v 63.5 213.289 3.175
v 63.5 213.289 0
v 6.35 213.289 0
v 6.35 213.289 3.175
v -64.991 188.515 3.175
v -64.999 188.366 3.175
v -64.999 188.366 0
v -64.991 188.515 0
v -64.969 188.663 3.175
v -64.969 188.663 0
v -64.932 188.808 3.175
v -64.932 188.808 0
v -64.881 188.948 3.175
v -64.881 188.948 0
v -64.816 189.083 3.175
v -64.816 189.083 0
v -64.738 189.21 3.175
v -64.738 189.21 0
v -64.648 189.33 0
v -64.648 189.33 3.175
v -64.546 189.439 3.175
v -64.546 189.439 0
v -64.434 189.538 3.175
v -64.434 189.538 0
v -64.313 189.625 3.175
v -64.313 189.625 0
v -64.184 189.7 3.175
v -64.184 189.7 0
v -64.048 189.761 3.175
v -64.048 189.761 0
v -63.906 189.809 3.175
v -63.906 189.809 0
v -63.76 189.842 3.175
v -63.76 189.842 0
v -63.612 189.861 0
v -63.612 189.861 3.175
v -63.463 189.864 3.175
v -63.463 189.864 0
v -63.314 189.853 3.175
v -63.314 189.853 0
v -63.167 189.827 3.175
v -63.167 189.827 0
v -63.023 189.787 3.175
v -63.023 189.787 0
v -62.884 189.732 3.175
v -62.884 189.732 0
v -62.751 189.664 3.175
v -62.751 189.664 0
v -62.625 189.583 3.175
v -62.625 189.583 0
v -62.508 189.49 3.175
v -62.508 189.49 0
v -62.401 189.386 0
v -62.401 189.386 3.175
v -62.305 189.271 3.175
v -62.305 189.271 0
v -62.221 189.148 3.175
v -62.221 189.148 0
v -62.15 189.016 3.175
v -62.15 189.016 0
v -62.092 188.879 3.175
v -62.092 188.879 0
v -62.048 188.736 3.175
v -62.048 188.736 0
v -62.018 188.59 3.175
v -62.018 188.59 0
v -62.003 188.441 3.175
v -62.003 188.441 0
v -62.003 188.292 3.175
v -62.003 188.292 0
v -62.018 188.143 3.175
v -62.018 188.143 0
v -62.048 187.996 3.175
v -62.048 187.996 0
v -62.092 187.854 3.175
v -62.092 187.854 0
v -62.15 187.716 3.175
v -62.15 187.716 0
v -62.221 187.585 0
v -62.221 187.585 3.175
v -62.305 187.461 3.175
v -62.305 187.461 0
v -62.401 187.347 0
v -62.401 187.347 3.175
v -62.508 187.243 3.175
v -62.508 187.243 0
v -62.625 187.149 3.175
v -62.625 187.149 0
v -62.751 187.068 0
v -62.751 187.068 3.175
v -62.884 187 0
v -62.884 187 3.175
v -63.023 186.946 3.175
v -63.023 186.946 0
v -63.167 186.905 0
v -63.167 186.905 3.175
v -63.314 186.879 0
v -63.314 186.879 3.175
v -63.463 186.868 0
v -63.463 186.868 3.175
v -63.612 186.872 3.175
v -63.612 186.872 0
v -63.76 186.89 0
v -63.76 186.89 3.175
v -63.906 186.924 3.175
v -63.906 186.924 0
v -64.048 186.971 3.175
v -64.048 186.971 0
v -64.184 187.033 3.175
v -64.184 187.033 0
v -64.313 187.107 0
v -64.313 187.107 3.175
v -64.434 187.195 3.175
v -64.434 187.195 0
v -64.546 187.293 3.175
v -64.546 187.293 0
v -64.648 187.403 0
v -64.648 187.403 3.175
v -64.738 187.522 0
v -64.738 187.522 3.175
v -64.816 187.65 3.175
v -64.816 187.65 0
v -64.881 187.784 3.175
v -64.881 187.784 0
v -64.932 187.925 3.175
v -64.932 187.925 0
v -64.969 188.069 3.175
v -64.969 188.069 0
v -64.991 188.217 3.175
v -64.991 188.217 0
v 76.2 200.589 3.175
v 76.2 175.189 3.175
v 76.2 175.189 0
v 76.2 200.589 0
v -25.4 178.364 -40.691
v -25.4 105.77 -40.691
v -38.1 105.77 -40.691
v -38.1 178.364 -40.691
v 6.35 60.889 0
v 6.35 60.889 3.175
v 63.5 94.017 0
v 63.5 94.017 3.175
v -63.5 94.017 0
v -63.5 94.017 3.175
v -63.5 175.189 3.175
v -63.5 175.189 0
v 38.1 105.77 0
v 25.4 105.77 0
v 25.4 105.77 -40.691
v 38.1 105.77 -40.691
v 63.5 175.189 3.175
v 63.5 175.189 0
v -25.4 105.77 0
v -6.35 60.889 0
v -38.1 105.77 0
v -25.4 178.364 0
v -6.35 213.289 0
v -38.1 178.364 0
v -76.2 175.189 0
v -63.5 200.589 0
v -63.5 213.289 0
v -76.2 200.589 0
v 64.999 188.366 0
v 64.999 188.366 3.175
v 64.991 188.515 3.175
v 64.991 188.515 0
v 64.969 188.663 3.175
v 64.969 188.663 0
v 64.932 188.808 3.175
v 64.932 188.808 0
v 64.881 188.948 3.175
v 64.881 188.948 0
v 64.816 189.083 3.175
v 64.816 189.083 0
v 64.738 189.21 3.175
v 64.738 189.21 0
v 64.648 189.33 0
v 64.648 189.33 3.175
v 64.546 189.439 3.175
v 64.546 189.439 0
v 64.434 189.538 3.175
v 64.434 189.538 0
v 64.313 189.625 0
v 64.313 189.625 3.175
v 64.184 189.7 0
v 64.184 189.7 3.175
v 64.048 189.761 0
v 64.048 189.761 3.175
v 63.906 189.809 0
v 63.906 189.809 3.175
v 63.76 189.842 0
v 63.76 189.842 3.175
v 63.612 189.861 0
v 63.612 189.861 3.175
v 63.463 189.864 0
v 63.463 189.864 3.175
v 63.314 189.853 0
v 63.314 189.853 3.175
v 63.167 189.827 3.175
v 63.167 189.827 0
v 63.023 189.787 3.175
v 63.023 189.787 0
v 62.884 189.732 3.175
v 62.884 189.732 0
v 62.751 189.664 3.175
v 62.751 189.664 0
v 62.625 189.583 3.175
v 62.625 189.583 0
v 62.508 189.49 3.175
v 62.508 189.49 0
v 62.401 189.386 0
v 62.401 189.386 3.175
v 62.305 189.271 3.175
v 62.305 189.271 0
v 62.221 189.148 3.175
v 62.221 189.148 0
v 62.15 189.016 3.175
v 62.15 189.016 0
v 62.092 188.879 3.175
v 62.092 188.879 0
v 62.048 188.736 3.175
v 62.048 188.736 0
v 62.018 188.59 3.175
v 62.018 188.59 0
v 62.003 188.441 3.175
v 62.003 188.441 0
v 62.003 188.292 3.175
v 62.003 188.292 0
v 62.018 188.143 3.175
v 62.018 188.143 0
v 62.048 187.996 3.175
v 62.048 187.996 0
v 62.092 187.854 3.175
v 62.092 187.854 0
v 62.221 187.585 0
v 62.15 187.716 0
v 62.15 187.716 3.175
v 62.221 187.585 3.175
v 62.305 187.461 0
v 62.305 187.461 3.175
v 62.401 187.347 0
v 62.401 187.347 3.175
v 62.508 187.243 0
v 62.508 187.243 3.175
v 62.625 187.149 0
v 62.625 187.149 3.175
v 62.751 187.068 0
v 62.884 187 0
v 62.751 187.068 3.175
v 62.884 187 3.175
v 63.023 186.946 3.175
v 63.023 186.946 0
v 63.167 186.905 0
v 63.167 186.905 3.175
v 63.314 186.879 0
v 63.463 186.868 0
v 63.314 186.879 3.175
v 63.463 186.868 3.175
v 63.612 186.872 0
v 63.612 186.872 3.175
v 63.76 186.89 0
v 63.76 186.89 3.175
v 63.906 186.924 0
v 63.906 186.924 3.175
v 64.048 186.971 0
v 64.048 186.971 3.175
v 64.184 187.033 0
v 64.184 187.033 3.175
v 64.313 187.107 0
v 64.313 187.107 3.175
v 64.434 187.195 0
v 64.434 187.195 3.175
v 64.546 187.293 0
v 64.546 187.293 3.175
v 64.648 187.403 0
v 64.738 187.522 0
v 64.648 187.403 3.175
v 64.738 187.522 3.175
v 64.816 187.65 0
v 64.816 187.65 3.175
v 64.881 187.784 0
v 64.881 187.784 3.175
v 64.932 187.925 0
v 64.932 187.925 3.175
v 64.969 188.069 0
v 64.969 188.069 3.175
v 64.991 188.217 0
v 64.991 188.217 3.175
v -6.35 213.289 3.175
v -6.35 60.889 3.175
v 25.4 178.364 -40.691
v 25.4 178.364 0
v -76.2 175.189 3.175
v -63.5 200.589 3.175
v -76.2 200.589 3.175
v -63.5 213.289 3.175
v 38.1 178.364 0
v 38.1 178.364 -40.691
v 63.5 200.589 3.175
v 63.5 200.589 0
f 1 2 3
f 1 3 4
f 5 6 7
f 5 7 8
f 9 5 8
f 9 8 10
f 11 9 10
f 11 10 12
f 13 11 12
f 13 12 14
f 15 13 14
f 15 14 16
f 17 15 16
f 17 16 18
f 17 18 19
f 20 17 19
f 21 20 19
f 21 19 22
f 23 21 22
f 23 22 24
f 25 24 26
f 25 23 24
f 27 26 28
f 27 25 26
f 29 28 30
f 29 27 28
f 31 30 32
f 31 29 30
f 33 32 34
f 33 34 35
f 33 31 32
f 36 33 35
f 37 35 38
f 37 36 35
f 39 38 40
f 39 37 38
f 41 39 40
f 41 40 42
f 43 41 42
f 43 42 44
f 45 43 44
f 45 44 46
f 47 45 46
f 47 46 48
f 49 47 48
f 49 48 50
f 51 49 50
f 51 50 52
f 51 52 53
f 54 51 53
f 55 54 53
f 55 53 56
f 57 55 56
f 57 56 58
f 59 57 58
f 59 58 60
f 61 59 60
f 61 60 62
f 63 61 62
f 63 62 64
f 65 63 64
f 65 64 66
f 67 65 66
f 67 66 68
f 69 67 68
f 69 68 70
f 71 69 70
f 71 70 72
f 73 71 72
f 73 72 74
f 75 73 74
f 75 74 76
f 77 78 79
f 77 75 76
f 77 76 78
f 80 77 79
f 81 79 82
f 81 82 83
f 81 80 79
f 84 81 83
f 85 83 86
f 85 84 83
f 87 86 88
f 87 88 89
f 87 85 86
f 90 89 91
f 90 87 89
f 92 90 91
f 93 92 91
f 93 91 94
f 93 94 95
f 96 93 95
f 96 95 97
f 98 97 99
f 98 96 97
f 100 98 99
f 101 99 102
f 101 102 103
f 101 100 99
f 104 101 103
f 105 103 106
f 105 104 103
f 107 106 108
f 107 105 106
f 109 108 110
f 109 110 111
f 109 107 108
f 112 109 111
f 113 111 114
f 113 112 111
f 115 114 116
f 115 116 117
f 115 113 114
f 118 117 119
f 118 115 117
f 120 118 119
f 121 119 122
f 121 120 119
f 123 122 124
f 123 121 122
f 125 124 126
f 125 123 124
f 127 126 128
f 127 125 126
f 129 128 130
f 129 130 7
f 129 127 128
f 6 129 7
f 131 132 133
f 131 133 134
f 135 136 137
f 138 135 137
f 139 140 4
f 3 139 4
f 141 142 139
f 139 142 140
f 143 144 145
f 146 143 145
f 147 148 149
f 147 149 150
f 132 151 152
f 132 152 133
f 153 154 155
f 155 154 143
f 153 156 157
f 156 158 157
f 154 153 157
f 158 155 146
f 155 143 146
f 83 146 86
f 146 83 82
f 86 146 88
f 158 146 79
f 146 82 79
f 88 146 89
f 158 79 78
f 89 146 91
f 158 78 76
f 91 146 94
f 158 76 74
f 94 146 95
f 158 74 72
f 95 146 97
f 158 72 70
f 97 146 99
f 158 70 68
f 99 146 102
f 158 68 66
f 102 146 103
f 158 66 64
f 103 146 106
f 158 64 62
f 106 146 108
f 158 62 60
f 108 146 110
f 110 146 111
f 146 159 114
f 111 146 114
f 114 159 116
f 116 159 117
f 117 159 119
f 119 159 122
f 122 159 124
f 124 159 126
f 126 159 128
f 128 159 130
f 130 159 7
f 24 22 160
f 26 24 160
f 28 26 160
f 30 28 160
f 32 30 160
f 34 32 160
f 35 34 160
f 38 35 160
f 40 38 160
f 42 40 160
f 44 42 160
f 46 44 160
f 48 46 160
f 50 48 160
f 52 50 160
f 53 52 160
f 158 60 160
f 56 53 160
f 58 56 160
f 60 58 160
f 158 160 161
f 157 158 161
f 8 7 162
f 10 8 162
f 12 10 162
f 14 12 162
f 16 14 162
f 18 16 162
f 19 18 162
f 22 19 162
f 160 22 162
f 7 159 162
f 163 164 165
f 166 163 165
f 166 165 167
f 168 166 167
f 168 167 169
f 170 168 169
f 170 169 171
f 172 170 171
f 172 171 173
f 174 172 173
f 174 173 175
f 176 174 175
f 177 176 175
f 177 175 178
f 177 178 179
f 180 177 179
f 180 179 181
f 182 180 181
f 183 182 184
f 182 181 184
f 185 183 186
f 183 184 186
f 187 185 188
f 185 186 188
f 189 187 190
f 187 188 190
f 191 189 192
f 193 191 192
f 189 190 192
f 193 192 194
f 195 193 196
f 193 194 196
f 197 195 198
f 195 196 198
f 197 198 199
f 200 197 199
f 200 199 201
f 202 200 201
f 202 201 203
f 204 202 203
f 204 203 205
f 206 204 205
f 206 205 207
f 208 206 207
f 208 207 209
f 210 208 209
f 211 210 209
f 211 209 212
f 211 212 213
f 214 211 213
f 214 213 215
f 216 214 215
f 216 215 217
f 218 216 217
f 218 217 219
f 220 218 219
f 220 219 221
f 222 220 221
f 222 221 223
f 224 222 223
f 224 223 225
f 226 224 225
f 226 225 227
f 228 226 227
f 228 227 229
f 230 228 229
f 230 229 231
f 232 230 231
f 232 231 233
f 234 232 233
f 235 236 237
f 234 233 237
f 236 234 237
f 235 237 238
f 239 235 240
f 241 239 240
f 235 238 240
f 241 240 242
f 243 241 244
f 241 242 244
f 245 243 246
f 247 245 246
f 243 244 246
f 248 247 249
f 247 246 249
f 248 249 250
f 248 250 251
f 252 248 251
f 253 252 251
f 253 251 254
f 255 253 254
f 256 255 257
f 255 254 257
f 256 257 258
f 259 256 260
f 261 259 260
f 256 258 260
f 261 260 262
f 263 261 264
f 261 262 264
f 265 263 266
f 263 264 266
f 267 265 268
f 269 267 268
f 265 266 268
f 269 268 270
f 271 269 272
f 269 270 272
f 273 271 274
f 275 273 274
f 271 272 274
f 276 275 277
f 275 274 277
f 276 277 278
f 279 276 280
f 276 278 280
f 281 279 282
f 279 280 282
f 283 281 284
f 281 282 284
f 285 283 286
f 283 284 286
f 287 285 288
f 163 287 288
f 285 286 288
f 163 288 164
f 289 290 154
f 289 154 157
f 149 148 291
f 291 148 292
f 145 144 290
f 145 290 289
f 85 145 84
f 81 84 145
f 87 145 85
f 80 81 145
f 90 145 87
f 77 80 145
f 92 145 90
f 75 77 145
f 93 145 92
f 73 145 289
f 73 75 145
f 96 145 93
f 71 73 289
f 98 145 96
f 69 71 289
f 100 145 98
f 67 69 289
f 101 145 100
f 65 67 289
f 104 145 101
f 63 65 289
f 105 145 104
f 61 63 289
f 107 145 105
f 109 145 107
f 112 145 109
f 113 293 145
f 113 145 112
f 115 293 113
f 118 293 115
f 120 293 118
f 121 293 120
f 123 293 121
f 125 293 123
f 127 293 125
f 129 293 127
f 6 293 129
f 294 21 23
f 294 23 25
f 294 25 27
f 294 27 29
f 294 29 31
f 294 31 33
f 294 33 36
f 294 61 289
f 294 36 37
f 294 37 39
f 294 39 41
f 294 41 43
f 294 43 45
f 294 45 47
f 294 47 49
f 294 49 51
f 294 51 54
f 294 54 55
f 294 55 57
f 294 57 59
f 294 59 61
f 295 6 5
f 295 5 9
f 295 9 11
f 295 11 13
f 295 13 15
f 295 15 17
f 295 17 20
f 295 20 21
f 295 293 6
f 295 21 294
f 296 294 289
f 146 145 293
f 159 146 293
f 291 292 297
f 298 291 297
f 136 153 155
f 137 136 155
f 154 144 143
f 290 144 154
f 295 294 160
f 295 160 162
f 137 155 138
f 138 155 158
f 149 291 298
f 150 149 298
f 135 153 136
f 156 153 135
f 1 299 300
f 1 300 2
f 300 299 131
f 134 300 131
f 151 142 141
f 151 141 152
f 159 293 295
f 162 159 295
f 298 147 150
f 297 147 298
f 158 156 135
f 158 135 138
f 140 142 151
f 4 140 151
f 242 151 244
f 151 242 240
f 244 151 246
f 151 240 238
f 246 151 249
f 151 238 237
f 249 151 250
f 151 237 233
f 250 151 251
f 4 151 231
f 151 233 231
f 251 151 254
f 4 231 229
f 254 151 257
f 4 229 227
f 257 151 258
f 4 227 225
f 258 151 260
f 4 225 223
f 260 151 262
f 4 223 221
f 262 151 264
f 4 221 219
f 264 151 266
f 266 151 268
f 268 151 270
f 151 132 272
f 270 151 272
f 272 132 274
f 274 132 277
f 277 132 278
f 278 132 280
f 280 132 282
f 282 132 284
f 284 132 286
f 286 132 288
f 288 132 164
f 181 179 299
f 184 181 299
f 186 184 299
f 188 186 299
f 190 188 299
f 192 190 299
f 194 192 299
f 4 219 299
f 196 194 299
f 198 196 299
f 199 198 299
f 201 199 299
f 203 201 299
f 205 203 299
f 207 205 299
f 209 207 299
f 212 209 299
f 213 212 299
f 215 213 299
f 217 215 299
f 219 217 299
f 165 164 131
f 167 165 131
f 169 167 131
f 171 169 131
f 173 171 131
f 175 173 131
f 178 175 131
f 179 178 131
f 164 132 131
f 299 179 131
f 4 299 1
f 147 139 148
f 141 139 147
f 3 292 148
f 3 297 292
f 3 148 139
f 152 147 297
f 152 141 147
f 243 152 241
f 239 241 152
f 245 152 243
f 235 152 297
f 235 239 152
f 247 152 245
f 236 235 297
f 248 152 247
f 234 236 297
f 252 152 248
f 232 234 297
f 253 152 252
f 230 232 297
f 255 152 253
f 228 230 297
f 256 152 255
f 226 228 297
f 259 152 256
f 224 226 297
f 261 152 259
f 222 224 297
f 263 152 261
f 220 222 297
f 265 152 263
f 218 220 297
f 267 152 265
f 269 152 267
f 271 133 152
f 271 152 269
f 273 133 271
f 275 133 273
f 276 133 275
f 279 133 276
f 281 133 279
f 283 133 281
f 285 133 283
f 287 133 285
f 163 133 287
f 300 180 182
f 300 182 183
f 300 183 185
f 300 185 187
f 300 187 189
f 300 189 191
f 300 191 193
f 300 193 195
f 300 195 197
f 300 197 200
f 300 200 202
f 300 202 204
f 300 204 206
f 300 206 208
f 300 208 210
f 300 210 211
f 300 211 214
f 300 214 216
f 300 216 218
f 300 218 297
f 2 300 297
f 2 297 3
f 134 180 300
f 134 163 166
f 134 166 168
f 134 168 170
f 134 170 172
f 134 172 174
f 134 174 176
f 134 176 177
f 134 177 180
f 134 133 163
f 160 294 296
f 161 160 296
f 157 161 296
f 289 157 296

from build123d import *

# Parameters (mm, degrees)
F2_W      = 152.4
F2_H      = 3.175
F3_DEPTH  = 69.85
F4_W      = 12.7
F4_H      = 114.3
F4_H_2    = 12.7
F5_DEPTH  = 254
F6_W      = 50.8
F6_H      = 22.225
F7_DEPTH  = 254
F9_DEPTH  = 254
F10_R     = 1.4986
F11_DEPTH = 254
F13_W     = 12.7
F13_H     = 72.5932
F14_DEPTH = 40.6908


with BuildPart() as f3:
    # F2 (on offset) → F3 (new body)
    with BuildSketch(Plane.YZ.offset(76.2)):
        with Locations((137.088685, 1.5875)):
            Rectangle(F2_W, F2_H)
    extrude(amount=-F3_DEPTH)

    # F4 (on face) → F5 (cut)
    with BuildSketch(Plane.XY.offset(3.175)):
        with Locations((69.85, 118.038685)):
            Rectangle(F4_W, F4_H)
        with Locations((69.85, 206.938685)):
            Rectangle(F4_W, F4_H_2)
    extrude(amount=-F5_DEPTH, mode=Mode.SUBTRACT)

    # F6 (on face) → F7 (cut)
    with BuildSketch(Plane.XZ.offset(-60.888685)):
        with Locations((31.75, 14.2875)):
            Rectangle(F6_W, F6_H)
    extrude(amount=-F7_DEPTH, mode=Mode.SUBTRACT)

    # F8 (on face) → F9 (cut)
    with BuildSketch(Plane.XY.offset(3.175)):
        Polygon((63.5, 94.017021), (6.35, 60.888685), (63.5, 60.888685), align=None)
    extrude(amount=-F9_DEPTH, mode=Mode.SUBTRACT)

    # F10 (on face) → F11 (cut)
    with BuildSketch(Plane.XY.offset(3.175)):
        with Locations((63.5, 188.366249)):
            Circle(F10_R)
    extrude(amount=-F11_DEPTH, mode=Mode.SUBTRACT)

    # F13 (on Top) → F14 (join)
    with BuildSketch(Plane.XY):
        with Locations((31.75, 142.067085)):
            Rectangle(F13_W, F13_H)
    extrude(amount=-F14_DEPTH)


with BuildPart() as f15_1:
    # F15: instance of F3
    add(f3.part.mirror(Plane.YZ))


solid = Compound([f3.part, f15_1.part])
